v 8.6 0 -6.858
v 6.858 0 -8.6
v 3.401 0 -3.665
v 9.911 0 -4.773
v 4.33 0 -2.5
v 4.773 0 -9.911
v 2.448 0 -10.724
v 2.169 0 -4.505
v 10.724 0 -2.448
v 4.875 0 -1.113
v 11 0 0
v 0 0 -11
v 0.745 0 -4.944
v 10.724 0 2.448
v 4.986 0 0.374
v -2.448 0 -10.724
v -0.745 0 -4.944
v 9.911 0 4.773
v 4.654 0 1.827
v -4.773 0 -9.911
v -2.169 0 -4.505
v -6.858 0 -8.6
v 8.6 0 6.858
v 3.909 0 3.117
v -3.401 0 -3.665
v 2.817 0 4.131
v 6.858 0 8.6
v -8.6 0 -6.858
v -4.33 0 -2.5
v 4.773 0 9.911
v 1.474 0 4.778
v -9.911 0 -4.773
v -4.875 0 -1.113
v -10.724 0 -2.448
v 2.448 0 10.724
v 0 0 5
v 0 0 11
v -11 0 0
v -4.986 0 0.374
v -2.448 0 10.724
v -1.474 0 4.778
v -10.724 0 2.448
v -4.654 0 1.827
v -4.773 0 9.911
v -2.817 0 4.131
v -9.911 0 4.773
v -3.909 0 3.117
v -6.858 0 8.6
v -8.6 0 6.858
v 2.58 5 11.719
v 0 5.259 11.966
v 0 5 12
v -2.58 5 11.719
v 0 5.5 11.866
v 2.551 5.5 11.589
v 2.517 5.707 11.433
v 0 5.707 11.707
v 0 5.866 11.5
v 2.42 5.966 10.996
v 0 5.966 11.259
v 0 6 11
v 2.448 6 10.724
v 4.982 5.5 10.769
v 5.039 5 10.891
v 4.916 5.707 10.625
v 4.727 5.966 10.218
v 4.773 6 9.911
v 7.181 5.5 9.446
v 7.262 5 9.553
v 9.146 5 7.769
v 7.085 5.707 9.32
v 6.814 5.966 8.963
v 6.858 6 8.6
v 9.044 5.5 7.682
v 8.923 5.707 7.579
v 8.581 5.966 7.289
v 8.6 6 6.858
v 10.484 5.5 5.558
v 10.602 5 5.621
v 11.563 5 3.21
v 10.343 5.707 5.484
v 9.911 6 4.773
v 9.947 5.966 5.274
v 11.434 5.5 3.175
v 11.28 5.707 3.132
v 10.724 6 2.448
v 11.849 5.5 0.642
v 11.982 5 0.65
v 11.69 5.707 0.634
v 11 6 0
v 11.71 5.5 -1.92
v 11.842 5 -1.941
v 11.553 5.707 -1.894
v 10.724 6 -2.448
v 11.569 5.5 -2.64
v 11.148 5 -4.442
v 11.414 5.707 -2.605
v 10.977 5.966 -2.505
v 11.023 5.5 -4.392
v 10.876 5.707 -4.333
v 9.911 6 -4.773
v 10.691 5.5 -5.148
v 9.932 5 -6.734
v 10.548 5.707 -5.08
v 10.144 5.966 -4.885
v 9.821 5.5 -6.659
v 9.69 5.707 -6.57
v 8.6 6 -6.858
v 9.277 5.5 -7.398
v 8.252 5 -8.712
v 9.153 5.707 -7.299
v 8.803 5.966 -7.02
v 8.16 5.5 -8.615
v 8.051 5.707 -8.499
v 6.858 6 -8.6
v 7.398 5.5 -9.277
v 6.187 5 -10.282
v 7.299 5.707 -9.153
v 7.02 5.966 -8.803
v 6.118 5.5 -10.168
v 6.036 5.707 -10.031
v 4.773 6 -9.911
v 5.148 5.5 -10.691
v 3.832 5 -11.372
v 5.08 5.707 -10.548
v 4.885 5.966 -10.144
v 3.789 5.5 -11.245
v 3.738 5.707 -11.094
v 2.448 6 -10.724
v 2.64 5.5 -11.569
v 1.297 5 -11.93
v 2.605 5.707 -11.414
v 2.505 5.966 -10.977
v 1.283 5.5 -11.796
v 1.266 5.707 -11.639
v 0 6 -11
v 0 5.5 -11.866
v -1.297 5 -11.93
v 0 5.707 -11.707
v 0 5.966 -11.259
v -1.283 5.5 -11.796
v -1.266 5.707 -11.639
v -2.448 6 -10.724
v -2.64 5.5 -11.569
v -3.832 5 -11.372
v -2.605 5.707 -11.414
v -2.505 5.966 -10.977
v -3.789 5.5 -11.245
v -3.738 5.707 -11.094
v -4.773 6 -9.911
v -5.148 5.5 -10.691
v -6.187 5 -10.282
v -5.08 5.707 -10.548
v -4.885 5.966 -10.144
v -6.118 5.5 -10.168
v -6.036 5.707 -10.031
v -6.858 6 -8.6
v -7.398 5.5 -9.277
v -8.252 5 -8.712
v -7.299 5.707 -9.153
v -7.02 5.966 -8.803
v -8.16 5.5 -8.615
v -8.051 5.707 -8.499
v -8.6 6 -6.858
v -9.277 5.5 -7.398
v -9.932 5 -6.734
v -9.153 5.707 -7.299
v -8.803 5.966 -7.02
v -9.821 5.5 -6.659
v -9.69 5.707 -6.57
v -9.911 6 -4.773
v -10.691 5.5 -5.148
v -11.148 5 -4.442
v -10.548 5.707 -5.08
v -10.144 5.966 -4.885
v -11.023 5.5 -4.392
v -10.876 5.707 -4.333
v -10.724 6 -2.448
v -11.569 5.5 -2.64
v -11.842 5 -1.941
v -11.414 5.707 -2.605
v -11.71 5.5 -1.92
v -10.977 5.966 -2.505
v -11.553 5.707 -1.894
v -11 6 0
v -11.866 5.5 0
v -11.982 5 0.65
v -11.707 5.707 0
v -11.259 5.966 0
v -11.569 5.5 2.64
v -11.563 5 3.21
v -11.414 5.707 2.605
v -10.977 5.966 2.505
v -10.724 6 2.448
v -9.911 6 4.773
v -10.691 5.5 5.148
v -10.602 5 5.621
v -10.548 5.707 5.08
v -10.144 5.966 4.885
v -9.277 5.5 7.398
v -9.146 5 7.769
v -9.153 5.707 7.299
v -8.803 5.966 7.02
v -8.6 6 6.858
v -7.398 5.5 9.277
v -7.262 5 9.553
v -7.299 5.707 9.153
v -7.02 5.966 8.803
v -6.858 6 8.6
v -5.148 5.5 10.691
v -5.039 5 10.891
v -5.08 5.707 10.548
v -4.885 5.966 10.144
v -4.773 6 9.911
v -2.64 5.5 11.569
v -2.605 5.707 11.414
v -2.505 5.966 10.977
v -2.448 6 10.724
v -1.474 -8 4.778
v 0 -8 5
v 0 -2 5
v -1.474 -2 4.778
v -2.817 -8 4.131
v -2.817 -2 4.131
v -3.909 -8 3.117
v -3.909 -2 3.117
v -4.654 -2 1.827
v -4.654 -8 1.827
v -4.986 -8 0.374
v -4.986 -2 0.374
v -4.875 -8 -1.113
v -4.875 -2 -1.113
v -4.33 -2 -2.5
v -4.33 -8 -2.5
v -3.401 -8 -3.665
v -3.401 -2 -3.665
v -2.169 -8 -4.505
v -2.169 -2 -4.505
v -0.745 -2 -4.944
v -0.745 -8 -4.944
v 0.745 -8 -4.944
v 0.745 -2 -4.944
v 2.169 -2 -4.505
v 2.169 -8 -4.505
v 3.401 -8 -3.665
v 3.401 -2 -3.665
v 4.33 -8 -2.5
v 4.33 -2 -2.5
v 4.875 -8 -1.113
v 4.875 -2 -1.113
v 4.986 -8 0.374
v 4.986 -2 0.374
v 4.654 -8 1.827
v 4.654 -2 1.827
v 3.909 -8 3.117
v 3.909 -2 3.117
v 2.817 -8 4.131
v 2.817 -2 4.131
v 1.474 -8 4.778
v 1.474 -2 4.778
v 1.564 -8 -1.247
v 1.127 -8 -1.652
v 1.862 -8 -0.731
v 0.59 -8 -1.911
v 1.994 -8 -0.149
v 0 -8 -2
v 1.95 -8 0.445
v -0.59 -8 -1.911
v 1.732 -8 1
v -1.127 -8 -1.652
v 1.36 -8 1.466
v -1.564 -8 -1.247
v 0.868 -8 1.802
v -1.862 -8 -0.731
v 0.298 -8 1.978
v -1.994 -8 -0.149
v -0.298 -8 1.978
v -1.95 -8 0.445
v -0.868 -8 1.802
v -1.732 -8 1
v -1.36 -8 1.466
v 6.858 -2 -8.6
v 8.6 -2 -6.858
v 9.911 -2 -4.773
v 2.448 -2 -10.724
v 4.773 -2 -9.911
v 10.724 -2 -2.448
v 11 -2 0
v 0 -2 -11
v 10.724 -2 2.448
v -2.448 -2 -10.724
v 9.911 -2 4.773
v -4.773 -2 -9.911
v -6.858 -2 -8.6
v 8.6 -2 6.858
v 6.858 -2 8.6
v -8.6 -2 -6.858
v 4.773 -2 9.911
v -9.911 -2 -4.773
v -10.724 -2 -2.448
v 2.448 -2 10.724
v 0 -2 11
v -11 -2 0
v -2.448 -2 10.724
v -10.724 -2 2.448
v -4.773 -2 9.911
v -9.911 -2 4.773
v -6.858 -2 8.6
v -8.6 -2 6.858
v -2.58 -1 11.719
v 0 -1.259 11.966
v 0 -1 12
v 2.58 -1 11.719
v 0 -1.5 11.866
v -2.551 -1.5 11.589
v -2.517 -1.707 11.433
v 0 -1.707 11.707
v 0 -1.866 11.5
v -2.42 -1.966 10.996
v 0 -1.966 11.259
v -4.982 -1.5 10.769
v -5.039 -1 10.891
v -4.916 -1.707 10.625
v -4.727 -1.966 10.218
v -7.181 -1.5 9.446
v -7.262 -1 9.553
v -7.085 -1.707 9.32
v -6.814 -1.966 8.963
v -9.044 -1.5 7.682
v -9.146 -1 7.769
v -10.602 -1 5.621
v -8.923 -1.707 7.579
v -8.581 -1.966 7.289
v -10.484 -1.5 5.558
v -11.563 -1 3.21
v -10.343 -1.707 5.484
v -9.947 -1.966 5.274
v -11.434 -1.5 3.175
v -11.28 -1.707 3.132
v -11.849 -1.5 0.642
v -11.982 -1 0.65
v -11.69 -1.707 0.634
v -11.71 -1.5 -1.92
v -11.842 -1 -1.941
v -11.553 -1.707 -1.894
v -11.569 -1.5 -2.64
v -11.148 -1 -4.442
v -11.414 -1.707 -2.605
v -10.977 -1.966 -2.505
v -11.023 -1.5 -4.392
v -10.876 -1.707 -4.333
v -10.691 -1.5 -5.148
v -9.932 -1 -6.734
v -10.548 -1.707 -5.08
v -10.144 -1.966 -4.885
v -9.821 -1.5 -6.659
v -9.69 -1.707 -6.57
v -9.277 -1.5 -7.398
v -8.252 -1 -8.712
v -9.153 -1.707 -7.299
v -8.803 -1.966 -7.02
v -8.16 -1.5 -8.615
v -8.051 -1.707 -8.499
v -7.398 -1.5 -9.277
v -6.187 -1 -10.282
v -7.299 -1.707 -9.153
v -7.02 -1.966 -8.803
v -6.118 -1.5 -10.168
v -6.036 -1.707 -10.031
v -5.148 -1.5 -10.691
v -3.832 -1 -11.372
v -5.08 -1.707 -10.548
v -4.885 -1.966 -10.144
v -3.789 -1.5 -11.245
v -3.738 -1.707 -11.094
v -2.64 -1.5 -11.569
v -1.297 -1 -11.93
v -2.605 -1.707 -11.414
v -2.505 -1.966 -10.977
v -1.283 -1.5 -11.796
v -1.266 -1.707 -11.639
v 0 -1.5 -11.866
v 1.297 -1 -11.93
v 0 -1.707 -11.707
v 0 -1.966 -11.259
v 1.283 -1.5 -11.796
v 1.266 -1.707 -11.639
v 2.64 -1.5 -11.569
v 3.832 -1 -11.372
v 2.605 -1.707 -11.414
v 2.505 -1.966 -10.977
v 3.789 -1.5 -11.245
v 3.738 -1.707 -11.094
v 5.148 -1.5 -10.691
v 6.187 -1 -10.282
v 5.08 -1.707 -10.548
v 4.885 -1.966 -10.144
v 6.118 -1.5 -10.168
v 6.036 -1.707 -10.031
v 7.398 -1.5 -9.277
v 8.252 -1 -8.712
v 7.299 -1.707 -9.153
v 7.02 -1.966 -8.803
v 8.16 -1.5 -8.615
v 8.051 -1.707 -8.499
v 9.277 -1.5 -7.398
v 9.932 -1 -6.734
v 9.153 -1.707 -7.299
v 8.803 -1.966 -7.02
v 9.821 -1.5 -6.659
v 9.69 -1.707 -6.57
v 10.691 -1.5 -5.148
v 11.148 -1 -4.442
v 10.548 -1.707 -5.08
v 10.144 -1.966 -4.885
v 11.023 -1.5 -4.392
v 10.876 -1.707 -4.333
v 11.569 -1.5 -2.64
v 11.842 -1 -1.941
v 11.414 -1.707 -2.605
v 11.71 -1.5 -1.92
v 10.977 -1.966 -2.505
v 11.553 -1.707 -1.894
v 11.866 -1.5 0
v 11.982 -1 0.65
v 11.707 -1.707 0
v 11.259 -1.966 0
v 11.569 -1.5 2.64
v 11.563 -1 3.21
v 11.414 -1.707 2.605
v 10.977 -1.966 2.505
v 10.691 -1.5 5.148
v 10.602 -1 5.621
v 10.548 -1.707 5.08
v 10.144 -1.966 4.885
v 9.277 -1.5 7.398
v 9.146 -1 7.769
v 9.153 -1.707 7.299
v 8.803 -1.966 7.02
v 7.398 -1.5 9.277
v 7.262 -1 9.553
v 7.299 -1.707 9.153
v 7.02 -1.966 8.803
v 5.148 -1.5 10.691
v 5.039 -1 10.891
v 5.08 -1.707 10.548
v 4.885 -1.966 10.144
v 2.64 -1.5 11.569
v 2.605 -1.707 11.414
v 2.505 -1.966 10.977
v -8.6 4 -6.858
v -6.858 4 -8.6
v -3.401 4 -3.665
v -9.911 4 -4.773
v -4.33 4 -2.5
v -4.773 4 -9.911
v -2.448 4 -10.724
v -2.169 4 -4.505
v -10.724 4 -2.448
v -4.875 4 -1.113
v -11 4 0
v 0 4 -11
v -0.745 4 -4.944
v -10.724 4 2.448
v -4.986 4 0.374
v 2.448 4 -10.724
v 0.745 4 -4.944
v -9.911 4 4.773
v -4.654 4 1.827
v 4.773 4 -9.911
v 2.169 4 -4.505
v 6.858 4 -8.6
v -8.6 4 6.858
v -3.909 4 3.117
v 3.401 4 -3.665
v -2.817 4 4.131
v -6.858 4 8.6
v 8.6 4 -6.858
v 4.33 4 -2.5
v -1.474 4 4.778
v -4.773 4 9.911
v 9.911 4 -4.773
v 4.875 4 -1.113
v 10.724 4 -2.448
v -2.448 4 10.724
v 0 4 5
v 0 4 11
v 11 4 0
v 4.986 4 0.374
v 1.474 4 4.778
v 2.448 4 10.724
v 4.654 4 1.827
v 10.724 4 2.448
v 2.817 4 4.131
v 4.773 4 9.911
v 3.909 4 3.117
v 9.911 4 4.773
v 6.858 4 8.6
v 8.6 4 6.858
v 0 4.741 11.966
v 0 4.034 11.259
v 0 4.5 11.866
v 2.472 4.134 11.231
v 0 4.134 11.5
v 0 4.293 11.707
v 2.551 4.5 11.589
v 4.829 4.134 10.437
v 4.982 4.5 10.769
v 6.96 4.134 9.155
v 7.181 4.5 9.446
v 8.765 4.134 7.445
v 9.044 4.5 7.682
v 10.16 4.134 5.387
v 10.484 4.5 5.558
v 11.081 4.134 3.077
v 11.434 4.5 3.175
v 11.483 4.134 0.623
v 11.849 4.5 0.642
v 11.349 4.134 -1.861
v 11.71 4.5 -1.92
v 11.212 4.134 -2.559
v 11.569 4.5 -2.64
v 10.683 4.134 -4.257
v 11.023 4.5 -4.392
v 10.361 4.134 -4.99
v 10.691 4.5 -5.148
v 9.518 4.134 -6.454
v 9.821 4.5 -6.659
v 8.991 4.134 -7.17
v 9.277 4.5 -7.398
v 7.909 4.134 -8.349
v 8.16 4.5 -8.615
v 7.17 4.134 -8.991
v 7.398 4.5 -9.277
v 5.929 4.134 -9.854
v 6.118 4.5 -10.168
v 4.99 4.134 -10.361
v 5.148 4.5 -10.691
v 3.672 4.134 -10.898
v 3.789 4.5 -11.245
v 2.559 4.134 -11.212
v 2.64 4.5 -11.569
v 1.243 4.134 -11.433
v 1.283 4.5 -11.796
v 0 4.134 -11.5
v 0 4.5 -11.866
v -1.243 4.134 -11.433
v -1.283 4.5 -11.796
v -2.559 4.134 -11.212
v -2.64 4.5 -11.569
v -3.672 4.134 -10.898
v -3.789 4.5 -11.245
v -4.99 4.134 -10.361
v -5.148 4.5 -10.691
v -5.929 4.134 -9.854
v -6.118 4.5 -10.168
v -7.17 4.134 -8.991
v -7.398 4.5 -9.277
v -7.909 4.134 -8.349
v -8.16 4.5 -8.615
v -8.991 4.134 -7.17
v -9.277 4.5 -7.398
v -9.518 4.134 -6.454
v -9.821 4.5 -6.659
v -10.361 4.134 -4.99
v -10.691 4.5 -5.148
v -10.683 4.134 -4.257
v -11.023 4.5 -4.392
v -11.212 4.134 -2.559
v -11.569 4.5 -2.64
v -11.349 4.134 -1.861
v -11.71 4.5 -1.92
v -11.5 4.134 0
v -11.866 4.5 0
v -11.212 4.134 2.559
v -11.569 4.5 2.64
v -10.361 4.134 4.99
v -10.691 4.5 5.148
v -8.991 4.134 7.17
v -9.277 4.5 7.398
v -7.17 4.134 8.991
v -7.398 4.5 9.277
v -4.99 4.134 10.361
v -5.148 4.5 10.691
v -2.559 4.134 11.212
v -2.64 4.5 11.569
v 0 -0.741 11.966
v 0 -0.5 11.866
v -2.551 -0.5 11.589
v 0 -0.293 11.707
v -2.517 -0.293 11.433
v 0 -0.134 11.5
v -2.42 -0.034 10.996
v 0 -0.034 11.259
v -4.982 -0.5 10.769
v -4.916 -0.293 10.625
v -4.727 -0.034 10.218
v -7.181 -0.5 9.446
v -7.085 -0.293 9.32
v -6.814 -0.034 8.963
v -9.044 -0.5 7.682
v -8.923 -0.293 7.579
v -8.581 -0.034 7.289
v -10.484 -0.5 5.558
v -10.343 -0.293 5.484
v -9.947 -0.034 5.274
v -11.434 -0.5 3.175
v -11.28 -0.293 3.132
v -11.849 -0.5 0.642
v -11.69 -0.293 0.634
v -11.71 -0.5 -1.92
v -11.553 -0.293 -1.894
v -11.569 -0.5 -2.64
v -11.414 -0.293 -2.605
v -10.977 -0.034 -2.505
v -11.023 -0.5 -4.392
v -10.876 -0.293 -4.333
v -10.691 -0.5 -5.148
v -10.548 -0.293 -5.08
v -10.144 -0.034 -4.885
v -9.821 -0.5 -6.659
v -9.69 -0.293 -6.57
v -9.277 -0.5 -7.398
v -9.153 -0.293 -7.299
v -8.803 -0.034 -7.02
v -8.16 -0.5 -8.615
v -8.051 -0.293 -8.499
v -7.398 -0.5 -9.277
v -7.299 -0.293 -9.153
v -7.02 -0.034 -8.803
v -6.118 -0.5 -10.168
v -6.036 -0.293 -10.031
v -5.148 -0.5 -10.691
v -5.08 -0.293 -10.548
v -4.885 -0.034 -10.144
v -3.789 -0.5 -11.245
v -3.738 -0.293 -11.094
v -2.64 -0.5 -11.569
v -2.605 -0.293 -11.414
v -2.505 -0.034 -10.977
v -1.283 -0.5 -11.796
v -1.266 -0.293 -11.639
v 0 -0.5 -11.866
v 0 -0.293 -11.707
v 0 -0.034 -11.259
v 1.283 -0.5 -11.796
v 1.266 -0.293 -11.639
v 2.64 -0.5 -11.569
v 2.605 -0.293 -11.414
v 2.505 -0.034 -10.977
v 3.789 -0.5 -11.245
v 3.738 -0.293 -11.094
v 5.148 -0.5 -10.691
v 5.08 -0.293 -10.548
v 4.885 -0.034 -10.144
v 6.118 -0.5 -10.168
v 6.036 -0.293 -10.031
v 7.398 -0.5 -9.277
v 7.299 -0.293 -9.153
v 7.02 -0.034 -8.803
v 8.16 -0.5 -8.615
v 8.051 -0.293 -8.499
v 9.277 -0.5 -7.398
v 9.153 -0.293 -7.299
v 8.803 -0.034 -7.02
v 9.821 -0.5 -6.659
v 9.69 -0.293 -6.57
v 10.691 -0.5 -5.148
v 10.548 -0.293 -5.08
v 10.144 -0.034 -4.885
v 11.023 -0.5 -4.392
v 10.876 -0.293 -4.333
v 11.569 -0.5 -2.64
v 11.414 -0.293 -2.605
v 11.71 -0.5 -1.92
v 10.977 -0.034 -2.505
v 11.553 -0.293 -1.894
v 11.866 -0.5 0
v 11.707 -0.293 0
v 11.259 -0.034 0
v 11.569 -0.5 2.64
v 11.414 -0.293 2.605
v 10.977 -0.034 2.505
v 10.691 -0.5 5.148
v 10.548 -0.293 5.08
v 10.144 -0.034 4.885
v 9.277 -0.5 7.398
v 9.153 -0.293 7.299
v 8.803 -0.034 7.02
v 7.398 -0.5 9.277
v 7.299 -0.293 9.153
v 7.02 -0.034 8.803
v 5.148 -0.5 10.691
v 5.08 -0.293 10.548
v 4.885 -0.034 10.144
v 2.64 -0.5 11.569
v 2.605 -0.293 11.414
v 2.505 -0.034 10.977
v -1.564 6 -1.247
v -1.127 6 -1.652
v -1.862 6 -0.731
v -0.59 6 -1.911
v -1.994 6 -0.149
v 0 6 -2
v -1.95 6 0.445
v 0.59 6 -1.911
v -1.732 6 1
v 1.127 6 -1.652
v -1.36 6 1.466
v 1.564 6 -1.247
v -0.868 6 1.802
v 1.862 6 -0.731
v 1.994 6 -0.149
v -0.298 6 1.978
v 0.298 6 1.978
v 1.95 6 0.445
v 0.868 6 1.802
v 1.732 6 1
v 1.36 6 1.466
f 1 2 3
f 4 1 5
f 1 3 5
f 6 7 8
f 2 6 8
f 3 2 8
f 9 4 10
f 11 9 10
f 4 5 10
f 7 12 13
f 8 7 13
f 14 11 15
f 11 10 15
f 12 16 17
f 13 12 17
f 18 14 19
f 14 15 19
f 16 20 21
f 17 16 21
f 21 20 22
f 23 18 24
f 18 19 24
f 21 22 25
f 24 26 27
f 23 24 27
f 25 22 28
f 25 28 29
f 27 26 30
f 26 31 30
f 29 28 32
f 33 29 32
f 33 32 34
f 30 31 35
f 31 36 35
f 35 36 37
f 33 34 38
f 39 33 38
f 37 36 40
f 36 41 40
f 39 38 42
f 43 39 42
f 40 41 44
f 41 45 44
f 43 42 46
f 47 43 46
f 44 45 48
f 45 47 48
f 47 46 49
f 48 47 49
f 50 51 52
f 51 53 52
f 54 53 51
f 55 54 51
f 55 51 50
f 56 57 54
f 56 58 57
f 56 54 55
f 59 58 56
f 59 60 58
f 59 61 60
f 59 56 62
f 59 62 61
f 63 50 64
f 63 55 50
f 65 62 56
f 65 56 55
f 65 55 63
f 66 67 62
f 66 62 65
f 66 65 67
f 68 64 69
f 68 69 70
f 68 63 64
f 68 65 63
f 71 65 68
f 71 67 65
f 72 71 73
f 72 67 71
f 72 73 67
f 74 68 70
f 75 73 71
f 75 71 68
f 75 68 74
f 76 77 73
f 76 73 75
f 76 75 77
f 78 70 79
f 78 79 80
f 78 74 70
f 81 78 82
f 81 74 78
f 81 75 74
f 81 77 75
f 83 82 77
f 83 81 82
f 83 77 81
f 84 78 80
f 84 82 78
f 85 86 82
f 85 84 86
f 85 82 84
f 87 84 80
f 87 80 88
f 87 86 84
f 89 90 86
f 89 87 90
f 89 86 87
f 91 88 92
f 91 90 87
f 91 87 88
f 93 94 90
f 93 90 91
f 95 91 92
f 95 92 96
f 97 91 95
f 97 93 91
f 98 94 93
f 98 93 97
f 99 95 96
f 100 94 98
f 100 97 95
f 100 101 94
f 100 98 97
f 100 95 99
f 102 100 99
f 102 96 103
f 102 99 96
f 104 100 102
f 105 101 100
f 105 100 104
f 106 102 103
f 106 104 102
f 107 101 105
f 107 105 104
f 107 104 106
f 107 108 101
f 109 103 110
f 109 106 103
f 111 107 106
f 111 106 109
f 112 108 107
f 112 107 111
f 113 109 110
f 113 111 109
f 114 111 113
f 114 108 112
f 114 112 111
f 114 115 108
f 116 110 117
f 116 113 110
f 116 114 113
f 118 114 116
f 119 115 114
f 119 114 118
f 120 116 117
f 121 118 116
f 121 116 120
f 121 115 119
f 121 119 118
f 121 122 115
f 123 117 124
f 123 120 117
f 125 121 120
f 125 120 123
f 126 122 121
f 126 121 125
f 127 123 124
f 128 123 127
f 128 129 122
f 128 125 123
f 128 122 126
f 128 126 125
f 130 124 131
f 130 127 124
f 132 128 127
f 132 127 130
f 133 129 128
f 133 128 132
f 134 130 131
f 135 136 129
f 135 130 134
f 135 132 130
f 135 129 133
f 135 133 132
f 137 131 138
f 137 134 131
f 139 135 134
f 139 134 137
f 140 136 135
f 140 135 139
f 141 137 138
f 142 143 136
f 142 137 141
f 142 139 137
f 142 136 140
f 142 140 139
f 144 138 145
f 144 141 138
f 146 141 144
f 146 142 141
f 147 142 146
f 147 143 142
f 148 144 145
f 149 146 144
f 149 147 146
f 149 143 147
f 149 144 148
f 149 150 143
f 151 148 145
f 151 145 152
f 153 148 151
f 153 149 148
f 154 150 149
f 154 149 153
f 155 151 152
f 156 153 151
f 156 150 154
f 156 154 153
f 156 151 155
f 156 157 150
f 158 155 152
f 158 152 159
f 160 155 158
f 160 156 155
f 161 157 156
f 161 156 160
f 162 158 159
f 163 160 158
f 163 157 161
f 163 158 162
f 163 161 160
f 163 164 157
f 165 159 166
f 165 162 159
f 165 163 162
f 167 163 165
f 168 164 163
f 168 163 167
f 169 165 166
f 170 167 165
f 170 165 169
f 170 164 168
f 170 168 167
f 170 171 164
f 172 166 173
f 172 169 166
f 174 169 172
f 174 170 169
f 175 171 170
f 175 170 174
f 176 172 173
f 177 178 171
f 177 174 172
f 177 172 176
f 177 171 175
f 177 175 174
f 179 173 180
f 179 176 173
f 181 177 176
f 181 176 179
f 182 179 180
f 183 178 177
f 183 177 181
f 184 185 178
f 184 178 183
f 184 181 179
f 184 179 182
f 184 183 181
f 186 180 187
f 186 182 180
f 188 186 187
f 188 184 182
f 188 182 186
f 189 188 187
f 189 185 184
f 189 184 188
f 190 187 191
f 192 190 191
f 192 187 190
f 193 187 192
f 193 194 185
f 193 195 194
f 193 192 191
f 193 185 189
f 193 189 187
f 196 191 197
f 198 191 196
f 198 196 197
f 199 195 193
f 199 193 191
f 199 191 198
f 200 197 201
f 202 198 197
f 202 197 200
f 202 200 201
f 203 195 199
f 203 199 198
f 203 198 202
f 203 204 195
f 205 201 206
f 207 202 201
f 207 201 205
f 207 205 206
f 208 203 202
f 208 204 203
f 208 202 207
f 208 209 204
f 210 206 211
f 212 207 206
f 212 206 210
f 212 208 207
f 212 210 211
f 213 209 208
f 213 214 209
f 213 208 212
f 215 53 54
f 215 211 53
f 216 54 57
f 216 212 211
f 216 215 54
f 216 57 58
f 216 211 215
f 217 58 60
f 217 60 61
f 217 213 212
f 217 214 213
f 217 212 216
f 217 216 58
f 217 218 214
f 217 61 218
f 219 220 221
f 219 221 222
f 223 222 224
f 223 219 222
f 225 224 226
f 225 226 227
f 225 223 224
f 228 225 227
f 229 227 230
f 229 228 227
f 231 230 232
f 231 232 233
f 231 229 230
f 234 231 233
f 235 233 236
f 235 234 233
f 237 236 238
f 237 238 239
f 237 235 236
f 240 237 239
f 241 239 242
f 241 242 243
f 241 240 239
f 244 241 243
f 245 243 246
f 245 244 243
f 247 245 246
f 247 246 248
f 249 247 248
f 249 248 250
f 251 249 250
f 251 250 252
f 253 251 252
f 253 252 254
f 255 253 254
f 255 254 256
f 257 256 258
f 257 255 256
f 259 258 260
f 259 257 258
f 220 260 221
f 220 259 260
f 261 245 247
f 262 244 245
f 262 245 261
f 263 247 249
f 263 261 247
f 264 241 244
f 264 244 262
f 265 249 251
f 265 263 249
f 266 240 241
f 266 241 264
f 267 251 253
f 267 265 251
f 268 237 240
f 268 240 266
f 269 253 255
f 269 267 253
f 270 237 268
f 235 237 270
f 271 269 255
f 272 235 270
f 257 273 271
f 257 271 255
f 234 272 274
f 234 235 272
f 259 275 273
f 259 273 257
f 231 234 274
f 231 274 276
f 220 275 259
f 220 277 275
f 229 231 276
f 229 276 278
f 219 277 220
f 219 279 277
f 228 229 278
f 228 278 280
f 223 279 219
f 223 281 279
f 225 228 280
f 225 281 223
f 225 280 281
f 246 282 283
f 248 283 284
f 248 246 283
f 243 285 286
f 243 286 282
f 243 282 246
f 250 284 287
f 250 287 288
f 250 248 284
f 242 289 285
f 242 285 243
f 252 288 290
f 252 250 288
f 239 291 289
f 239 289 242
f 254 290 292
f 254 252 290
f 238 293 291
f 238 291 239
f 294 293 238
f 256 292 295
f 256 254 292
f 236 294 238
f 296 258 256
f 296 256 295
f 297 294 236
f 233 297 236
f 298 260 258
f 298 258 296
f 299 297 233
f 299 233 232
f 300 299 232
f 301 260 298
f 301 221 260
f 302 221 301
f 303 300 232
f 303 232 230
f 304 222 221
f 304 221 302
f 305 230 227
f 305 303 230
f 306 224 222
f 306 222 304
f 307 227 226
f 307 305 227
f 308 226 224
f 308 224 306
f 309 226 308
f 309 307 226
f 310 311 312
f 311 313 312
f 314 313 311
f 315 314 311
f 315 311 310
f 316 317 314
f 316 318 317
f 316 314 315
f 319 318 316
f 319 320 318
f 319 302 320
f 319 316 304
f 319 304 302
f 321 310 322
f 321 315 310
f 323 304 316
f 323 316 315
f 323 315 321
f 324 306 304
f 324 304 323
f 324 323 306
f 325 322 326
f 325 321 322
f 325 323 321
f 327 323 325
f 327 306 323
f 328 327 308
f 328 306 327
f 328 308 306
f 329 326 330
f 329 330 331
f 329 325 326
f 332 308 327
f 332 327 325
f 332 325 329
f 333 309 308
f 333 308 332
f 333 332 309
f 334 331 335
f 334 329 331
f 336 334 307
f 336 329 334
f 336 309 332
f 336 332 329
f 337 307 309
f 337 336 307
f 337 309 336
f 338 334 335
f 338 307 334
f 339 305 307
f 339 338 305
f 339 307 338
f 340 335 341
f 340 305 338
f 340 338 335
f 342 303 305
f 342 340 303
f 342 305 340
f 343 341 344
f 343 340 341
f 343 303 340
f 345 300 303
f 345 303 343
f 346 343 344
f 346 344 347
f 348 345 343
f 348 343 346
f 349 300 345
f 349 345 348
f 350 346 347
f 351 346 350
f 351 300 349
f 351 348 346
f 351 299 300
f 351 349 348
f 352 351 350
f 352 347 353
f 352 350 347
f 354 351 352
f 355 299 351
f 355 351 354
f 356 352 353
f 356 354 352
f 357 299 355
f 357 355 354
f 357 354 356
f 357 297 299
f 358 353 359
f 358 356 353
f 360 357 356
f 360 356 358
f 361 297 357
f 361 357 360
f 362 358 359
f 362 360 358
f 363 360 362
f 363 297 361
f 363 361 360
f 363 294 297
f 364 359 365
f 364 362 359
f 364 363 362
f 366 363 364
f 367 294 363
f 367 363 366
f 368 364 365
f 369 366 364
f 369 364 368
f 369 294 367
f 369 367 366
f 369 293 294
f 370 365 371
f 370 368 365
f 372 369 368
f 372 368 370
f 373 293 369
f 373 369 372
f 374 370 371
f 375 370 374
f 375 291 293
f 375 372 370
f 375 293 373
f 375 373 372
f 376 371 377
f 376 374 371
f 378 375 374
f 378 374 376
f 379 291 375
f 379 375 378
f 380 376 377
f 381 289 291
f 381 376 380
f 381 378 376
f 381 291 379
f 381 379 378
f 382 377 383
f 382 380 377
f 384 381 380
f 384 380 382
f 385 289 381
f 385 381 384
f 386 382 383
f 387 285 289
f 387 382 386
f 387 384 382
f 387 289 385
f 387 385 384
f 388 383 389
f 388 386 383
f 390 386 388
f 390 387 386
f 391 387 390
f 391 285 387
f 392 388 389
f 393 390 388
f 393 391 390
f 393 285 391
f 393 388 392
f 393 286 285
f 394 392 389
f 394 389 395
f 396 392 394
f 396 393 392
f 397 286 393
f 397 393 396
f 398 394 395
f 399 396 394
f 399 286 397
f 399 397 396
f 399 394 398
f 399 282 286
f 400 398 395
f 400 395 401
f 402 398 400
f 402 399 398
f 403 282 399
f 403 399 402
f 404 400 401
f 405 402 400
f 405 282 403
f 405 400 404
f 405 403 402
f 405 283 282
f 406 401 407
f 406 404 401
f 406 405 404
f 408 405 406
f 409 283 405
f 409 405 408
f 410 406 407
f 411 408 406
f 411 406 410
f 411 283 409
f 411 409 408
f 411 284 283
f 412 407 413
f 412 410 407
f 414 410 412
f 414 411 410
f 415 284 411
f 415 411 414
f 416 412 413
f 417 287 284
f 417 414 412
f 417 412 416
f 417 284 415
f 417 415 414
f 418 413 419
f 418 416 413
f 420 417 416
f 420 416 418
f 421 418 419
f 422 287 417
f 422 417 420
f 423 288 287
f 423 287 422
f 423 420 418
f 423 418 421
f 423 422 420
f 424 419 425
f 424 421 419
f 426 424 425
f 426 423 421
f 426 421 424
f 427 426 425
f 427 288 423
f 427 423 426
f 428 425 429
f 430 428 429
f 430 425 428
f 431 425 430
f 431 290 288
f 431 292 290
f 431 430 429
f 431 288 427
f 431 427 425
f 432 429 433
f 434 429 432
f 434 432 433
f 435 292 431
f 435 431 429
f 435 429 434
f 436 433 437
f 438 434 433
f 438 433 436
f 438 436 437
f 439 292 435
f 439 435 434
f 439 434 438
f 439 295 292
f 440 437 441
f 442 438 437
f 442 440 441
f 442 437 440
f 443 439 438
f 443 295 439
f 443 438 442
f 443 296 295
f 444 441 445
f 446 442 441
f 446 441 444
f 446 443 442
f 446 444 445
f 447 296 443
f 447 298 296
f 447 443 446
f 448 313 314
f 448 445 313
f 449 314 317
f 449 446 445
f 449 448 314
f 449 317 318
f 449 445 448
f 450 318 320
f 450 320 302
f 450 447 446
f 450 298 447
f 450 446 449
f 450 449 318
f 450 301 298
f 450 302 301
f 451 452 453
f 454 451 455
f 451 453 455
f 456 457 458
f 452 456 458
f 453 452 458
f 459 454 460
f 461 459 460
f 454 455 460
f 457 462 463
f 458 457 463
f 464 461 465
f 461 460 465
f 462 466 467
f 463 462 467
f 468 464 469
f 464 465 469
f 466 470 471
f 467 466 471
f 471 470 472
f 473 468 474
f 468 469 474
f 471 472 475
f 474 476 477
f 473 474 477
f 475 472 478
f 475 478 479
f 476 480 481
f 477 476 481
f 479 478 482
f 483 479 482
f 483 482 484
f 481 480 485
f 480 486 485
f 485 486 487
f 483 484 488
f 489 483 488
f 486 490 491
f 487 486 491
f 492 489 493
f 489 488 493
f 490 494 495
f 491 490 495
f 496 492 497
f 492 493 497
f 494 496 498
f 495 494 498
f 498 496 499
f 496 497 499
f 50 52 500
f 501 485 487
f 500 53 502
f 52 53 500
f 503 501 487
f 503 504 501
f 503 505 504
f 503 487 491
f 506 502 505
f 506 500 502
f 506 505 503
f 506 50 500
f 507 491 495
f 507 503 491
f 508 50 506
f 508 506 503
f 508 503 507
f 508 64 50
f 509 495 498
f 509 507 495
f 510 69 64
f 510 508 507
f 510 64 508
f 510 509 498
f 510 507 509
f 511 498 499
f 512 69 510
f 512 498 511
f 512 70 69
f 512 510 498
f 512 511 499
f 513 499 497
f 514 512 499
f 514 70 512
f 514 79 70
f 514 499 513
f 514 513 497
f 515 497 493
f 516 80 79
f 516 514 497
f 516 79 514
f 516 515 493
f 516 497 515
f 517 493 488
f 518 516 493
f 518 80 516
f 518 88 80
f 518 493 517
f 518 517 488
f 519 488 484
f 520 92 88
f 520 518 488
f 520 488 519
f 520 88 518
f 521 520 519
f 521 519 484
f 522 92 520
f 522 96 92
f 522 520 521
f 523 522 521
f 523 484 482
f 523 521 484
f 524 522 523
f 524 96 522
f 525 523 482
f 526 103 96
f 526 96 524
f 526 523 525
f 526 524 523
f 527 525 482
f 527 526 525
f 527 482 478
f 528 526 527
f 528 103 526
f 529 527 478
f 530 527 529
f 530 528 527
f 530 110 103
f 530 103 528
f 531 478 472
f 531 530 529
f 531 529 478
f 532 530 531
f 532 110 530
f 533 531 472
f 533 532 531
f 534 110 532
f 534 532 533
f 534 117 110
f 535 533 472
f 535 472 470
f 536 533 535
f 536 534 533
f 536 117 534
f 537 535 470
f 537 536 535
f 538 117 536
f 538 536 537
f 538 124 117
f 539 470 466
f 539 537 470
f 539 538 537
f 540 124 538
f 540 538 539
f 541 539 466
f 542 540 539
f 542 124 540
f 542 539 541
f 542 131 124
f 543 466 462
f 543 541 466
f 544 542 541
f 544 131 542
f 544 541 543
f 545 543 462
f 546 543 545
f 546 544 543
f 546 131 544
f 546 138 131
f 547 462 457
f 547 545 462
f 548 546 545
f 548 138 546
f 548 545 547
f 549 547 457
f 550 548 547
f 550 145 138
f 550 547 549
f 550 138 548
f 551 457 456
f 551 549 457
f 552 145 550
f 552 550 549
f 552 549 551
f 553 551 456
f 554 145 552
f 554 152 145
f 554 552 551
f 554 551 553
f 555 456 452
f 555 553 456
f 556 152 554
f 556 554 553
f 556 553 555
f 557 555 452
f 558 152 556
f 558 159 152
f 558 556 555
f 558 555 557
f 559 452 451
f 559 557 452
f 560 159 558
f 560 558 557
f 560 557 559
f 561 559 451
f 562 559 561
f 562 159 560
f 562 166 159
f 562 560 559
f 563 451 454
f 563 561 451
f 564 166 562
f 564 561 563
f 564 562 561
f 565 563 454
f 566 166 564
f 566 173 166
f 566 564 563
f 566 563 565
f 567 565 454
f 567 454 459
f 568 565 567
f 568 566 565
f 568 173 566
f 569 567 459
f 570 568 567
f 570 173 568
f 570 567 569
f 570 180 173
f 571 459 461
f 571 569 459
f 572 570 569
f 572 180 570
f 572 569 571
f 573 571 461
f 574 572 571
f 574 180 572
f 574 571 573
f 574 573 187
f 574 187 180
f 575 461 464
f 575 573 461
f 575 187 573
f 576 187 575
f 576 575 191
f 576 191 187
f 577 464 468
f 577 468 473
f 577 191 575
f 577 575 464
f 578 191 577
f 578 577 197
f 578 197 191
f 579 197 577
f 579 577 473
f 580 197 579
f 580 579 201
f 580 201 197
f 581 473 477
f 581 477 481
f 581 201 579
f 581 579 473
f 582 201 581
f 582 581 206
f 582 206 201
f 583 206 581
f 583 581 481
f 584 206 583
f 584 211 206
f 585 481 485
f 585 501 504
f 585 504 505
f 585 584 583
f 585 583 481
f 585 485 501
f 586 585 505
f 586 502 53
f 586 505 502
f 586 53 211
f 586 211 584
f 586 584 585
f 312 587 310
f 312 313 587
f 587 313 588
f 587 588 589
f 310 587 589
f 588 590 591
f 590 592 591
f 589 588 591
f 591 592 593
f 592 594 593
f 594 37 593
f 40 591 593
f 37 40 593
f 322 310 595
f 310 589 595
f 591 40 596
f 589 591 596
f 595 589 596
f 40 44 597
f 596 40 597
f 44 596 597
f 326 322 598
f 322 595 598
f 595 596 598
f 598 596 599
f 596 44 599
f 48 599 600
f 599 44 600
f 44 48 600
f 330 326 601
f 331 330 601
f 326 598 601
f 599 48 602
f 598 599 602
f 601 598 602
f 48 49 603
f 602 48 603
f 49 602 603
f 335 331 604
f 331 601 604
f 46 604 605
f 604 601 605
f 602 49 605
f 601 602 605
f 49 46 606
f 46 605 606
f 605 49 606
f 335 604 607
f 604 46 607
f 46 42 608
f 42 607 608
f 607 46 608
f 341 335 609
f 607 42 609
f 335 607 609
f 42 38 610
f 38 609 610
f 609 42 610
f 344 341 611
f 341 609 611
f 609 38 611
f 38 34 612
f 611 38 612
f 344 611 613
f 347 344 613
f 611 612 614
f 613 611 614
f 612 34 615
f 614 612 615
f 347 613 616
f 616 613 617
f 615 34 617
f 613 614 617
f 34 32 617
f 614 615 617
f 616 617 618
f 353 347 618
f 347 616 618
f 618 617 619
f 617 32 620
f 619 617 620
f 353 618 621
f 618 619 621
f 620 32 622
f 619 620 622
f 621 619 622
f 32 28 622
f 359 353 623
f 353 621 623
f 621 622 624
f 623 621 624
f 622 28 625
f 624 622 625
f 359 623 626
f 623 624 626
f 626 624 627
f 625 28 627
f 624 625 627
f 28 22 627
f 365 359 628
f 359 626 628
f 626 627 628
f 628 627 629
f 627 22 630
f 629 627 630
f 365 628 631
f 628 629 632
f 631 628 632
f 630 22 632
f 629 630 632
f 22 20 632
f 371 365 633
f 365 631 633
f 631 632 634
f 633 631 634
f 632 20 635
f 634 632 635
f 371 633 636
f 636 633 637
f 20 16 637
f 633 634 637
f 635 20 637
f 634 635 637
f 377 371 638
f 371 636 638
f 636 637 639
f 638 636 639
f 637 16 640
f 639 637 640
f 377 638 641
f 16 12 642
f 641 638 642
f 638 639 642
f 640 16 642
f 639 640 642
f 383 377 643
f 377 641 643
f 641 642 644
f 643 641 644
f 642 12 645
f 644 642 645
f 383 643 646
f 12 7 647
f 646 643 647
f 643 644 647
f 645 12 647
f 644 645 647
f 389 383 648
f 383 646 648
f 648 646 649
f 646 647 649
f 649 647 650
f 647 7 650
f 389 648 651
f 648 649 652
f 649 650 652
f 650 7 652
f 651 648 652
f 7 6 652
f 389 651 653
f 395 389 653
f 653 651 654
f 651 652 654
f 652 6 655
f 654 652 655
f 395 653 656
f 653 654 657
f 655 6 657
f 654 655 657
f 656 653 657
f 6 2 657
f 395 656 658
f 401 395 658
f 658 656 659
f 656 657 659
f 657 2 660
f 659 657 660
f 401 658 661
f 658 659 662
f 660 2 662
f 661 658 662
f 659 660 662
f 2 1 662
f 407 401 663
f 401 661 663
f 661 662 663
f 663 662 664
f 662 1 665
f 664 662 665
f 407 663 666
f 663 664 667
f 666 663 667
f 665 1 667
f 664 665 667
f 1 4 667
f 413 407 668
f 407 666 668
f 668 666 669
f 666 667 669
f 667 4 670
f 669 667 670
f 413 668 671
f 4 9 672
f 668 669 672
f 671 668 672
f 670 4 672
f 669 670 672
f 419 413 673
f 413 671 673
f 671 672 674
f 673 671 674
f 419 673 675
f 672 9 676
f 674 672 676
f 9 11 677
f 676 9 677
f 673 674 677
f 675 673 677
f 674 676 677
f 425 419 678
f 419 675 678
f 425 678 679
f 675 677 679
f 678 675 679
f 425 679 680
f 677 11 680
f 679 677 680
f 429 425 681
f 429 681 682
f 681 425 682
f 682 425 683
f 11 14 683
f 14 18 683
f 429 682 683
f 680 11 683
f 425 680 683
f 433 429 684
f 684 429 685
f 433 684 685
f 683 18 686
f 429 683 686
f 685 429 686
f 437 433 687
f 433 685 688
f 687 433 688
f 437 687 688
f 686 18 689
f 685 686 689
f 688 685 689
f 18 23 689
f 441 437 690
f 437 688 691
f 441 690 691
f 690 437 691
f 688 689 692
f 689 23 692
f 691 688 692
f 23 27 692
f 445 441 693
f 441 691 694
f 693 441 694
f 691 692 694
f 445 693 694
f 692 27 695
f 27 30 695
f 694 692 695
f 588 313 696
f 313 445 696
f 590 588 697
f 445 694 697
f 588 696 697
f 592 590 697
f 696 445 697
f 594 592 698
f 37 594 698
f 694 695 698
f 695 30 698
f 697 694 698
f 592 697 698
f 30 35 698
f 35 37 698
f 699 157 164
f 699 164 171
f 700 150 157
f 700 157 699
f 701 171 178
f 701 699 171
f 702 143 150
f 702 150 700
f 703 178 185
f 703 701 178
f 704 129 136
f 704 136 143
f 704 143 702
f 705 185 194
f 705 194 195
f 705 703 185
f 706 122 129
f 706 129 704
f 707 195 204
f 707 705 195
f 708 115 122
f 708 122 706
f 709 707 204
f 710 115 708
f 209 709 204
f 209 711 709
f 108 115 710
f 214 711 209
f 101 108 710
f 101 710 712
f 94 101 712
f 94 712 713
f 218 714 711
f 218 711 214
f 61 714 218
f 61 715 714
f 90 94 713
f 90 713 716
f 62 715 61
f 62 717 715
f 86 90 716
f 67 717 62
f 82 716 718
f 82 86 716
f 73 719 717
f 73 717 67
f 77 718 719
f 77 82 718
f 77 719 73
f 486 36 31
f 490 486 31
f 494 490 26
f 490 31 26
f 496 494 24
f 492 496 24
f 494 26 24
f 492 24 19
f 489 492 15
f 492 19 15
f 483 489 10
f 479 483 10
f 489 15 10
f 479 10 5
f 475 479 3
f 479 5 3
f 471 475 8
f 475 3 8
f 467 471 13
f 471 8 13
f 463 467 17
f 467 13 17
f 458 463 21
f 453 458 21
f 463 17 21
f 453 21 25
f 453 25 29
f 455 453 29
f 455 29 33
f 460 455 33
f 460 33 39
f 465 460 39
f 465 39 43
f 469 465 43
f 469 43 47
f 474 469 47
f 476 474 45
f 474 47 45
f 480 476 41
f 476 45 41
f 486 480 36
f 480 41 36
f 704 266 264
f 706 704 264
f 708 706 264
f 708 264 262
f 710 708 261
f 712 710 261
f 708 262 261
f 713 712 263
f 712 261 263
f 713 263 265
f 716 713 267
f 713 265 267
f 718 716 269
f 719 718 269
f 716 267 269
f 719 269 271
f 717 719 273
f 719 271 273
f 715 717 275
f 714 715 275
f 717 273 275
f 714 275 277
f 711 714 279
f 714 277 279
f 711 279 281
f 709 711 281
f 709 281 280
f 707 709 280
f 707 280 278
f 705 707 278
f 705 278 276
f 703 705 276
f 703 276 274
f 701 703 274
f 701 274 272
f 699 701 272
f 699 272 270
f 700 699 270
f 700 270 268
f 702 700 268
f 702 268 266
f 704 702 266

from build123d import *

# Parameters (mm, degrees)
SKETCH_1_R          = 5
EXTRUDE_1_DEPTH     = 4
SKETCH_2_R          = 12
EXTRUDE_2_DEPTH     = 2
EXTRUDE_START       = 2
SKETCH_3_R          = 12
EXTRUDE_3_DEPTH     = 2
EXTRUDE_START_2     = 6
SKETCH_4_R          = 5
EXTRUDE_4_DEPTH     = 6
SKETCH_5_R          = 2
CUT_EXTRUDE_1_DEPTH = 23
FILLET_2_R          = 1


with BuildPart() as part:
    # 草图1 → 凸台-拉伸1 (new body)
    with BuildSketch(Plane(origin=(0, 0, 0), x_dir=(1, 0, 0), z_dir=(0, 1, 0))):
        with Locations(Location((0, 0, 0), (0, 0, 270))):
            Circle(SKETCH_1_R)
    extrude(amount=EXTRUDE_1_DEPTH)

    # 草图2 → 凸台-拉伸2 (add)
    with BuildSketch(Plane(origin=(0, 4, 0), x_dir=(1, 0, 0), z_dir=(0, 1, 0))):
        with Locations(Location((0, 0, 0), (0, 0, 270))):
            Circle(SKETCH_2_R)
    extrude(amount=EXTRUDE_2_DEPTH)

    # 草图3 → 凸台-拉伸3 (add)
    with BuildSketch(Plane.XZ.offset(EXTRUDE_START)):
        with Locations(Location((0, 0, 0), (0, 0, 90))):
            Circle(SKETCH_3_R)
    extrude(amount=-EXTRUDE_3_DEPTH)

    # 草图4 → 凸台-拉伸4 (add)
    with BuildSketch(Plane(origin=(0, -2, 0), x_dir=(-1, 0, 0), z_dir=(0, -1, 0)).offset(EXTRUDE_START_2)):
        with Locations(Location((0, 0, 0), (0, 0, 270))):
            Circle(SKETCH_4_R)
    extrude(amount=-EXTRUDE_4_DEPTH)

    # 草图5 → 切除-拉伸1 (cut, through all)
    with BuildSketch(Plane.XZ.offset(8)):
        with Locations(Location((0, 0, 0), (0, 0, 270))):
            Circle(SKETCH_5_R)
    extrude(amount=-CUT_EXTRUDE_1_DEPTH, mode=Mode.SUBTRACT)

    # 圆角2
    fillet_2_edges = [part.edges().sort_by_distance(p)[0] for p in [
        (0, -2, -12),
        (0, 4, -12),
        (0, 6, -12),
        (0, 0, -12),
    ]]
    fillet(fillet_2_edges, radius=FILLET_2_R - 0.0001)  # a hair under: the kernel refuses the full size


solid = part.part
